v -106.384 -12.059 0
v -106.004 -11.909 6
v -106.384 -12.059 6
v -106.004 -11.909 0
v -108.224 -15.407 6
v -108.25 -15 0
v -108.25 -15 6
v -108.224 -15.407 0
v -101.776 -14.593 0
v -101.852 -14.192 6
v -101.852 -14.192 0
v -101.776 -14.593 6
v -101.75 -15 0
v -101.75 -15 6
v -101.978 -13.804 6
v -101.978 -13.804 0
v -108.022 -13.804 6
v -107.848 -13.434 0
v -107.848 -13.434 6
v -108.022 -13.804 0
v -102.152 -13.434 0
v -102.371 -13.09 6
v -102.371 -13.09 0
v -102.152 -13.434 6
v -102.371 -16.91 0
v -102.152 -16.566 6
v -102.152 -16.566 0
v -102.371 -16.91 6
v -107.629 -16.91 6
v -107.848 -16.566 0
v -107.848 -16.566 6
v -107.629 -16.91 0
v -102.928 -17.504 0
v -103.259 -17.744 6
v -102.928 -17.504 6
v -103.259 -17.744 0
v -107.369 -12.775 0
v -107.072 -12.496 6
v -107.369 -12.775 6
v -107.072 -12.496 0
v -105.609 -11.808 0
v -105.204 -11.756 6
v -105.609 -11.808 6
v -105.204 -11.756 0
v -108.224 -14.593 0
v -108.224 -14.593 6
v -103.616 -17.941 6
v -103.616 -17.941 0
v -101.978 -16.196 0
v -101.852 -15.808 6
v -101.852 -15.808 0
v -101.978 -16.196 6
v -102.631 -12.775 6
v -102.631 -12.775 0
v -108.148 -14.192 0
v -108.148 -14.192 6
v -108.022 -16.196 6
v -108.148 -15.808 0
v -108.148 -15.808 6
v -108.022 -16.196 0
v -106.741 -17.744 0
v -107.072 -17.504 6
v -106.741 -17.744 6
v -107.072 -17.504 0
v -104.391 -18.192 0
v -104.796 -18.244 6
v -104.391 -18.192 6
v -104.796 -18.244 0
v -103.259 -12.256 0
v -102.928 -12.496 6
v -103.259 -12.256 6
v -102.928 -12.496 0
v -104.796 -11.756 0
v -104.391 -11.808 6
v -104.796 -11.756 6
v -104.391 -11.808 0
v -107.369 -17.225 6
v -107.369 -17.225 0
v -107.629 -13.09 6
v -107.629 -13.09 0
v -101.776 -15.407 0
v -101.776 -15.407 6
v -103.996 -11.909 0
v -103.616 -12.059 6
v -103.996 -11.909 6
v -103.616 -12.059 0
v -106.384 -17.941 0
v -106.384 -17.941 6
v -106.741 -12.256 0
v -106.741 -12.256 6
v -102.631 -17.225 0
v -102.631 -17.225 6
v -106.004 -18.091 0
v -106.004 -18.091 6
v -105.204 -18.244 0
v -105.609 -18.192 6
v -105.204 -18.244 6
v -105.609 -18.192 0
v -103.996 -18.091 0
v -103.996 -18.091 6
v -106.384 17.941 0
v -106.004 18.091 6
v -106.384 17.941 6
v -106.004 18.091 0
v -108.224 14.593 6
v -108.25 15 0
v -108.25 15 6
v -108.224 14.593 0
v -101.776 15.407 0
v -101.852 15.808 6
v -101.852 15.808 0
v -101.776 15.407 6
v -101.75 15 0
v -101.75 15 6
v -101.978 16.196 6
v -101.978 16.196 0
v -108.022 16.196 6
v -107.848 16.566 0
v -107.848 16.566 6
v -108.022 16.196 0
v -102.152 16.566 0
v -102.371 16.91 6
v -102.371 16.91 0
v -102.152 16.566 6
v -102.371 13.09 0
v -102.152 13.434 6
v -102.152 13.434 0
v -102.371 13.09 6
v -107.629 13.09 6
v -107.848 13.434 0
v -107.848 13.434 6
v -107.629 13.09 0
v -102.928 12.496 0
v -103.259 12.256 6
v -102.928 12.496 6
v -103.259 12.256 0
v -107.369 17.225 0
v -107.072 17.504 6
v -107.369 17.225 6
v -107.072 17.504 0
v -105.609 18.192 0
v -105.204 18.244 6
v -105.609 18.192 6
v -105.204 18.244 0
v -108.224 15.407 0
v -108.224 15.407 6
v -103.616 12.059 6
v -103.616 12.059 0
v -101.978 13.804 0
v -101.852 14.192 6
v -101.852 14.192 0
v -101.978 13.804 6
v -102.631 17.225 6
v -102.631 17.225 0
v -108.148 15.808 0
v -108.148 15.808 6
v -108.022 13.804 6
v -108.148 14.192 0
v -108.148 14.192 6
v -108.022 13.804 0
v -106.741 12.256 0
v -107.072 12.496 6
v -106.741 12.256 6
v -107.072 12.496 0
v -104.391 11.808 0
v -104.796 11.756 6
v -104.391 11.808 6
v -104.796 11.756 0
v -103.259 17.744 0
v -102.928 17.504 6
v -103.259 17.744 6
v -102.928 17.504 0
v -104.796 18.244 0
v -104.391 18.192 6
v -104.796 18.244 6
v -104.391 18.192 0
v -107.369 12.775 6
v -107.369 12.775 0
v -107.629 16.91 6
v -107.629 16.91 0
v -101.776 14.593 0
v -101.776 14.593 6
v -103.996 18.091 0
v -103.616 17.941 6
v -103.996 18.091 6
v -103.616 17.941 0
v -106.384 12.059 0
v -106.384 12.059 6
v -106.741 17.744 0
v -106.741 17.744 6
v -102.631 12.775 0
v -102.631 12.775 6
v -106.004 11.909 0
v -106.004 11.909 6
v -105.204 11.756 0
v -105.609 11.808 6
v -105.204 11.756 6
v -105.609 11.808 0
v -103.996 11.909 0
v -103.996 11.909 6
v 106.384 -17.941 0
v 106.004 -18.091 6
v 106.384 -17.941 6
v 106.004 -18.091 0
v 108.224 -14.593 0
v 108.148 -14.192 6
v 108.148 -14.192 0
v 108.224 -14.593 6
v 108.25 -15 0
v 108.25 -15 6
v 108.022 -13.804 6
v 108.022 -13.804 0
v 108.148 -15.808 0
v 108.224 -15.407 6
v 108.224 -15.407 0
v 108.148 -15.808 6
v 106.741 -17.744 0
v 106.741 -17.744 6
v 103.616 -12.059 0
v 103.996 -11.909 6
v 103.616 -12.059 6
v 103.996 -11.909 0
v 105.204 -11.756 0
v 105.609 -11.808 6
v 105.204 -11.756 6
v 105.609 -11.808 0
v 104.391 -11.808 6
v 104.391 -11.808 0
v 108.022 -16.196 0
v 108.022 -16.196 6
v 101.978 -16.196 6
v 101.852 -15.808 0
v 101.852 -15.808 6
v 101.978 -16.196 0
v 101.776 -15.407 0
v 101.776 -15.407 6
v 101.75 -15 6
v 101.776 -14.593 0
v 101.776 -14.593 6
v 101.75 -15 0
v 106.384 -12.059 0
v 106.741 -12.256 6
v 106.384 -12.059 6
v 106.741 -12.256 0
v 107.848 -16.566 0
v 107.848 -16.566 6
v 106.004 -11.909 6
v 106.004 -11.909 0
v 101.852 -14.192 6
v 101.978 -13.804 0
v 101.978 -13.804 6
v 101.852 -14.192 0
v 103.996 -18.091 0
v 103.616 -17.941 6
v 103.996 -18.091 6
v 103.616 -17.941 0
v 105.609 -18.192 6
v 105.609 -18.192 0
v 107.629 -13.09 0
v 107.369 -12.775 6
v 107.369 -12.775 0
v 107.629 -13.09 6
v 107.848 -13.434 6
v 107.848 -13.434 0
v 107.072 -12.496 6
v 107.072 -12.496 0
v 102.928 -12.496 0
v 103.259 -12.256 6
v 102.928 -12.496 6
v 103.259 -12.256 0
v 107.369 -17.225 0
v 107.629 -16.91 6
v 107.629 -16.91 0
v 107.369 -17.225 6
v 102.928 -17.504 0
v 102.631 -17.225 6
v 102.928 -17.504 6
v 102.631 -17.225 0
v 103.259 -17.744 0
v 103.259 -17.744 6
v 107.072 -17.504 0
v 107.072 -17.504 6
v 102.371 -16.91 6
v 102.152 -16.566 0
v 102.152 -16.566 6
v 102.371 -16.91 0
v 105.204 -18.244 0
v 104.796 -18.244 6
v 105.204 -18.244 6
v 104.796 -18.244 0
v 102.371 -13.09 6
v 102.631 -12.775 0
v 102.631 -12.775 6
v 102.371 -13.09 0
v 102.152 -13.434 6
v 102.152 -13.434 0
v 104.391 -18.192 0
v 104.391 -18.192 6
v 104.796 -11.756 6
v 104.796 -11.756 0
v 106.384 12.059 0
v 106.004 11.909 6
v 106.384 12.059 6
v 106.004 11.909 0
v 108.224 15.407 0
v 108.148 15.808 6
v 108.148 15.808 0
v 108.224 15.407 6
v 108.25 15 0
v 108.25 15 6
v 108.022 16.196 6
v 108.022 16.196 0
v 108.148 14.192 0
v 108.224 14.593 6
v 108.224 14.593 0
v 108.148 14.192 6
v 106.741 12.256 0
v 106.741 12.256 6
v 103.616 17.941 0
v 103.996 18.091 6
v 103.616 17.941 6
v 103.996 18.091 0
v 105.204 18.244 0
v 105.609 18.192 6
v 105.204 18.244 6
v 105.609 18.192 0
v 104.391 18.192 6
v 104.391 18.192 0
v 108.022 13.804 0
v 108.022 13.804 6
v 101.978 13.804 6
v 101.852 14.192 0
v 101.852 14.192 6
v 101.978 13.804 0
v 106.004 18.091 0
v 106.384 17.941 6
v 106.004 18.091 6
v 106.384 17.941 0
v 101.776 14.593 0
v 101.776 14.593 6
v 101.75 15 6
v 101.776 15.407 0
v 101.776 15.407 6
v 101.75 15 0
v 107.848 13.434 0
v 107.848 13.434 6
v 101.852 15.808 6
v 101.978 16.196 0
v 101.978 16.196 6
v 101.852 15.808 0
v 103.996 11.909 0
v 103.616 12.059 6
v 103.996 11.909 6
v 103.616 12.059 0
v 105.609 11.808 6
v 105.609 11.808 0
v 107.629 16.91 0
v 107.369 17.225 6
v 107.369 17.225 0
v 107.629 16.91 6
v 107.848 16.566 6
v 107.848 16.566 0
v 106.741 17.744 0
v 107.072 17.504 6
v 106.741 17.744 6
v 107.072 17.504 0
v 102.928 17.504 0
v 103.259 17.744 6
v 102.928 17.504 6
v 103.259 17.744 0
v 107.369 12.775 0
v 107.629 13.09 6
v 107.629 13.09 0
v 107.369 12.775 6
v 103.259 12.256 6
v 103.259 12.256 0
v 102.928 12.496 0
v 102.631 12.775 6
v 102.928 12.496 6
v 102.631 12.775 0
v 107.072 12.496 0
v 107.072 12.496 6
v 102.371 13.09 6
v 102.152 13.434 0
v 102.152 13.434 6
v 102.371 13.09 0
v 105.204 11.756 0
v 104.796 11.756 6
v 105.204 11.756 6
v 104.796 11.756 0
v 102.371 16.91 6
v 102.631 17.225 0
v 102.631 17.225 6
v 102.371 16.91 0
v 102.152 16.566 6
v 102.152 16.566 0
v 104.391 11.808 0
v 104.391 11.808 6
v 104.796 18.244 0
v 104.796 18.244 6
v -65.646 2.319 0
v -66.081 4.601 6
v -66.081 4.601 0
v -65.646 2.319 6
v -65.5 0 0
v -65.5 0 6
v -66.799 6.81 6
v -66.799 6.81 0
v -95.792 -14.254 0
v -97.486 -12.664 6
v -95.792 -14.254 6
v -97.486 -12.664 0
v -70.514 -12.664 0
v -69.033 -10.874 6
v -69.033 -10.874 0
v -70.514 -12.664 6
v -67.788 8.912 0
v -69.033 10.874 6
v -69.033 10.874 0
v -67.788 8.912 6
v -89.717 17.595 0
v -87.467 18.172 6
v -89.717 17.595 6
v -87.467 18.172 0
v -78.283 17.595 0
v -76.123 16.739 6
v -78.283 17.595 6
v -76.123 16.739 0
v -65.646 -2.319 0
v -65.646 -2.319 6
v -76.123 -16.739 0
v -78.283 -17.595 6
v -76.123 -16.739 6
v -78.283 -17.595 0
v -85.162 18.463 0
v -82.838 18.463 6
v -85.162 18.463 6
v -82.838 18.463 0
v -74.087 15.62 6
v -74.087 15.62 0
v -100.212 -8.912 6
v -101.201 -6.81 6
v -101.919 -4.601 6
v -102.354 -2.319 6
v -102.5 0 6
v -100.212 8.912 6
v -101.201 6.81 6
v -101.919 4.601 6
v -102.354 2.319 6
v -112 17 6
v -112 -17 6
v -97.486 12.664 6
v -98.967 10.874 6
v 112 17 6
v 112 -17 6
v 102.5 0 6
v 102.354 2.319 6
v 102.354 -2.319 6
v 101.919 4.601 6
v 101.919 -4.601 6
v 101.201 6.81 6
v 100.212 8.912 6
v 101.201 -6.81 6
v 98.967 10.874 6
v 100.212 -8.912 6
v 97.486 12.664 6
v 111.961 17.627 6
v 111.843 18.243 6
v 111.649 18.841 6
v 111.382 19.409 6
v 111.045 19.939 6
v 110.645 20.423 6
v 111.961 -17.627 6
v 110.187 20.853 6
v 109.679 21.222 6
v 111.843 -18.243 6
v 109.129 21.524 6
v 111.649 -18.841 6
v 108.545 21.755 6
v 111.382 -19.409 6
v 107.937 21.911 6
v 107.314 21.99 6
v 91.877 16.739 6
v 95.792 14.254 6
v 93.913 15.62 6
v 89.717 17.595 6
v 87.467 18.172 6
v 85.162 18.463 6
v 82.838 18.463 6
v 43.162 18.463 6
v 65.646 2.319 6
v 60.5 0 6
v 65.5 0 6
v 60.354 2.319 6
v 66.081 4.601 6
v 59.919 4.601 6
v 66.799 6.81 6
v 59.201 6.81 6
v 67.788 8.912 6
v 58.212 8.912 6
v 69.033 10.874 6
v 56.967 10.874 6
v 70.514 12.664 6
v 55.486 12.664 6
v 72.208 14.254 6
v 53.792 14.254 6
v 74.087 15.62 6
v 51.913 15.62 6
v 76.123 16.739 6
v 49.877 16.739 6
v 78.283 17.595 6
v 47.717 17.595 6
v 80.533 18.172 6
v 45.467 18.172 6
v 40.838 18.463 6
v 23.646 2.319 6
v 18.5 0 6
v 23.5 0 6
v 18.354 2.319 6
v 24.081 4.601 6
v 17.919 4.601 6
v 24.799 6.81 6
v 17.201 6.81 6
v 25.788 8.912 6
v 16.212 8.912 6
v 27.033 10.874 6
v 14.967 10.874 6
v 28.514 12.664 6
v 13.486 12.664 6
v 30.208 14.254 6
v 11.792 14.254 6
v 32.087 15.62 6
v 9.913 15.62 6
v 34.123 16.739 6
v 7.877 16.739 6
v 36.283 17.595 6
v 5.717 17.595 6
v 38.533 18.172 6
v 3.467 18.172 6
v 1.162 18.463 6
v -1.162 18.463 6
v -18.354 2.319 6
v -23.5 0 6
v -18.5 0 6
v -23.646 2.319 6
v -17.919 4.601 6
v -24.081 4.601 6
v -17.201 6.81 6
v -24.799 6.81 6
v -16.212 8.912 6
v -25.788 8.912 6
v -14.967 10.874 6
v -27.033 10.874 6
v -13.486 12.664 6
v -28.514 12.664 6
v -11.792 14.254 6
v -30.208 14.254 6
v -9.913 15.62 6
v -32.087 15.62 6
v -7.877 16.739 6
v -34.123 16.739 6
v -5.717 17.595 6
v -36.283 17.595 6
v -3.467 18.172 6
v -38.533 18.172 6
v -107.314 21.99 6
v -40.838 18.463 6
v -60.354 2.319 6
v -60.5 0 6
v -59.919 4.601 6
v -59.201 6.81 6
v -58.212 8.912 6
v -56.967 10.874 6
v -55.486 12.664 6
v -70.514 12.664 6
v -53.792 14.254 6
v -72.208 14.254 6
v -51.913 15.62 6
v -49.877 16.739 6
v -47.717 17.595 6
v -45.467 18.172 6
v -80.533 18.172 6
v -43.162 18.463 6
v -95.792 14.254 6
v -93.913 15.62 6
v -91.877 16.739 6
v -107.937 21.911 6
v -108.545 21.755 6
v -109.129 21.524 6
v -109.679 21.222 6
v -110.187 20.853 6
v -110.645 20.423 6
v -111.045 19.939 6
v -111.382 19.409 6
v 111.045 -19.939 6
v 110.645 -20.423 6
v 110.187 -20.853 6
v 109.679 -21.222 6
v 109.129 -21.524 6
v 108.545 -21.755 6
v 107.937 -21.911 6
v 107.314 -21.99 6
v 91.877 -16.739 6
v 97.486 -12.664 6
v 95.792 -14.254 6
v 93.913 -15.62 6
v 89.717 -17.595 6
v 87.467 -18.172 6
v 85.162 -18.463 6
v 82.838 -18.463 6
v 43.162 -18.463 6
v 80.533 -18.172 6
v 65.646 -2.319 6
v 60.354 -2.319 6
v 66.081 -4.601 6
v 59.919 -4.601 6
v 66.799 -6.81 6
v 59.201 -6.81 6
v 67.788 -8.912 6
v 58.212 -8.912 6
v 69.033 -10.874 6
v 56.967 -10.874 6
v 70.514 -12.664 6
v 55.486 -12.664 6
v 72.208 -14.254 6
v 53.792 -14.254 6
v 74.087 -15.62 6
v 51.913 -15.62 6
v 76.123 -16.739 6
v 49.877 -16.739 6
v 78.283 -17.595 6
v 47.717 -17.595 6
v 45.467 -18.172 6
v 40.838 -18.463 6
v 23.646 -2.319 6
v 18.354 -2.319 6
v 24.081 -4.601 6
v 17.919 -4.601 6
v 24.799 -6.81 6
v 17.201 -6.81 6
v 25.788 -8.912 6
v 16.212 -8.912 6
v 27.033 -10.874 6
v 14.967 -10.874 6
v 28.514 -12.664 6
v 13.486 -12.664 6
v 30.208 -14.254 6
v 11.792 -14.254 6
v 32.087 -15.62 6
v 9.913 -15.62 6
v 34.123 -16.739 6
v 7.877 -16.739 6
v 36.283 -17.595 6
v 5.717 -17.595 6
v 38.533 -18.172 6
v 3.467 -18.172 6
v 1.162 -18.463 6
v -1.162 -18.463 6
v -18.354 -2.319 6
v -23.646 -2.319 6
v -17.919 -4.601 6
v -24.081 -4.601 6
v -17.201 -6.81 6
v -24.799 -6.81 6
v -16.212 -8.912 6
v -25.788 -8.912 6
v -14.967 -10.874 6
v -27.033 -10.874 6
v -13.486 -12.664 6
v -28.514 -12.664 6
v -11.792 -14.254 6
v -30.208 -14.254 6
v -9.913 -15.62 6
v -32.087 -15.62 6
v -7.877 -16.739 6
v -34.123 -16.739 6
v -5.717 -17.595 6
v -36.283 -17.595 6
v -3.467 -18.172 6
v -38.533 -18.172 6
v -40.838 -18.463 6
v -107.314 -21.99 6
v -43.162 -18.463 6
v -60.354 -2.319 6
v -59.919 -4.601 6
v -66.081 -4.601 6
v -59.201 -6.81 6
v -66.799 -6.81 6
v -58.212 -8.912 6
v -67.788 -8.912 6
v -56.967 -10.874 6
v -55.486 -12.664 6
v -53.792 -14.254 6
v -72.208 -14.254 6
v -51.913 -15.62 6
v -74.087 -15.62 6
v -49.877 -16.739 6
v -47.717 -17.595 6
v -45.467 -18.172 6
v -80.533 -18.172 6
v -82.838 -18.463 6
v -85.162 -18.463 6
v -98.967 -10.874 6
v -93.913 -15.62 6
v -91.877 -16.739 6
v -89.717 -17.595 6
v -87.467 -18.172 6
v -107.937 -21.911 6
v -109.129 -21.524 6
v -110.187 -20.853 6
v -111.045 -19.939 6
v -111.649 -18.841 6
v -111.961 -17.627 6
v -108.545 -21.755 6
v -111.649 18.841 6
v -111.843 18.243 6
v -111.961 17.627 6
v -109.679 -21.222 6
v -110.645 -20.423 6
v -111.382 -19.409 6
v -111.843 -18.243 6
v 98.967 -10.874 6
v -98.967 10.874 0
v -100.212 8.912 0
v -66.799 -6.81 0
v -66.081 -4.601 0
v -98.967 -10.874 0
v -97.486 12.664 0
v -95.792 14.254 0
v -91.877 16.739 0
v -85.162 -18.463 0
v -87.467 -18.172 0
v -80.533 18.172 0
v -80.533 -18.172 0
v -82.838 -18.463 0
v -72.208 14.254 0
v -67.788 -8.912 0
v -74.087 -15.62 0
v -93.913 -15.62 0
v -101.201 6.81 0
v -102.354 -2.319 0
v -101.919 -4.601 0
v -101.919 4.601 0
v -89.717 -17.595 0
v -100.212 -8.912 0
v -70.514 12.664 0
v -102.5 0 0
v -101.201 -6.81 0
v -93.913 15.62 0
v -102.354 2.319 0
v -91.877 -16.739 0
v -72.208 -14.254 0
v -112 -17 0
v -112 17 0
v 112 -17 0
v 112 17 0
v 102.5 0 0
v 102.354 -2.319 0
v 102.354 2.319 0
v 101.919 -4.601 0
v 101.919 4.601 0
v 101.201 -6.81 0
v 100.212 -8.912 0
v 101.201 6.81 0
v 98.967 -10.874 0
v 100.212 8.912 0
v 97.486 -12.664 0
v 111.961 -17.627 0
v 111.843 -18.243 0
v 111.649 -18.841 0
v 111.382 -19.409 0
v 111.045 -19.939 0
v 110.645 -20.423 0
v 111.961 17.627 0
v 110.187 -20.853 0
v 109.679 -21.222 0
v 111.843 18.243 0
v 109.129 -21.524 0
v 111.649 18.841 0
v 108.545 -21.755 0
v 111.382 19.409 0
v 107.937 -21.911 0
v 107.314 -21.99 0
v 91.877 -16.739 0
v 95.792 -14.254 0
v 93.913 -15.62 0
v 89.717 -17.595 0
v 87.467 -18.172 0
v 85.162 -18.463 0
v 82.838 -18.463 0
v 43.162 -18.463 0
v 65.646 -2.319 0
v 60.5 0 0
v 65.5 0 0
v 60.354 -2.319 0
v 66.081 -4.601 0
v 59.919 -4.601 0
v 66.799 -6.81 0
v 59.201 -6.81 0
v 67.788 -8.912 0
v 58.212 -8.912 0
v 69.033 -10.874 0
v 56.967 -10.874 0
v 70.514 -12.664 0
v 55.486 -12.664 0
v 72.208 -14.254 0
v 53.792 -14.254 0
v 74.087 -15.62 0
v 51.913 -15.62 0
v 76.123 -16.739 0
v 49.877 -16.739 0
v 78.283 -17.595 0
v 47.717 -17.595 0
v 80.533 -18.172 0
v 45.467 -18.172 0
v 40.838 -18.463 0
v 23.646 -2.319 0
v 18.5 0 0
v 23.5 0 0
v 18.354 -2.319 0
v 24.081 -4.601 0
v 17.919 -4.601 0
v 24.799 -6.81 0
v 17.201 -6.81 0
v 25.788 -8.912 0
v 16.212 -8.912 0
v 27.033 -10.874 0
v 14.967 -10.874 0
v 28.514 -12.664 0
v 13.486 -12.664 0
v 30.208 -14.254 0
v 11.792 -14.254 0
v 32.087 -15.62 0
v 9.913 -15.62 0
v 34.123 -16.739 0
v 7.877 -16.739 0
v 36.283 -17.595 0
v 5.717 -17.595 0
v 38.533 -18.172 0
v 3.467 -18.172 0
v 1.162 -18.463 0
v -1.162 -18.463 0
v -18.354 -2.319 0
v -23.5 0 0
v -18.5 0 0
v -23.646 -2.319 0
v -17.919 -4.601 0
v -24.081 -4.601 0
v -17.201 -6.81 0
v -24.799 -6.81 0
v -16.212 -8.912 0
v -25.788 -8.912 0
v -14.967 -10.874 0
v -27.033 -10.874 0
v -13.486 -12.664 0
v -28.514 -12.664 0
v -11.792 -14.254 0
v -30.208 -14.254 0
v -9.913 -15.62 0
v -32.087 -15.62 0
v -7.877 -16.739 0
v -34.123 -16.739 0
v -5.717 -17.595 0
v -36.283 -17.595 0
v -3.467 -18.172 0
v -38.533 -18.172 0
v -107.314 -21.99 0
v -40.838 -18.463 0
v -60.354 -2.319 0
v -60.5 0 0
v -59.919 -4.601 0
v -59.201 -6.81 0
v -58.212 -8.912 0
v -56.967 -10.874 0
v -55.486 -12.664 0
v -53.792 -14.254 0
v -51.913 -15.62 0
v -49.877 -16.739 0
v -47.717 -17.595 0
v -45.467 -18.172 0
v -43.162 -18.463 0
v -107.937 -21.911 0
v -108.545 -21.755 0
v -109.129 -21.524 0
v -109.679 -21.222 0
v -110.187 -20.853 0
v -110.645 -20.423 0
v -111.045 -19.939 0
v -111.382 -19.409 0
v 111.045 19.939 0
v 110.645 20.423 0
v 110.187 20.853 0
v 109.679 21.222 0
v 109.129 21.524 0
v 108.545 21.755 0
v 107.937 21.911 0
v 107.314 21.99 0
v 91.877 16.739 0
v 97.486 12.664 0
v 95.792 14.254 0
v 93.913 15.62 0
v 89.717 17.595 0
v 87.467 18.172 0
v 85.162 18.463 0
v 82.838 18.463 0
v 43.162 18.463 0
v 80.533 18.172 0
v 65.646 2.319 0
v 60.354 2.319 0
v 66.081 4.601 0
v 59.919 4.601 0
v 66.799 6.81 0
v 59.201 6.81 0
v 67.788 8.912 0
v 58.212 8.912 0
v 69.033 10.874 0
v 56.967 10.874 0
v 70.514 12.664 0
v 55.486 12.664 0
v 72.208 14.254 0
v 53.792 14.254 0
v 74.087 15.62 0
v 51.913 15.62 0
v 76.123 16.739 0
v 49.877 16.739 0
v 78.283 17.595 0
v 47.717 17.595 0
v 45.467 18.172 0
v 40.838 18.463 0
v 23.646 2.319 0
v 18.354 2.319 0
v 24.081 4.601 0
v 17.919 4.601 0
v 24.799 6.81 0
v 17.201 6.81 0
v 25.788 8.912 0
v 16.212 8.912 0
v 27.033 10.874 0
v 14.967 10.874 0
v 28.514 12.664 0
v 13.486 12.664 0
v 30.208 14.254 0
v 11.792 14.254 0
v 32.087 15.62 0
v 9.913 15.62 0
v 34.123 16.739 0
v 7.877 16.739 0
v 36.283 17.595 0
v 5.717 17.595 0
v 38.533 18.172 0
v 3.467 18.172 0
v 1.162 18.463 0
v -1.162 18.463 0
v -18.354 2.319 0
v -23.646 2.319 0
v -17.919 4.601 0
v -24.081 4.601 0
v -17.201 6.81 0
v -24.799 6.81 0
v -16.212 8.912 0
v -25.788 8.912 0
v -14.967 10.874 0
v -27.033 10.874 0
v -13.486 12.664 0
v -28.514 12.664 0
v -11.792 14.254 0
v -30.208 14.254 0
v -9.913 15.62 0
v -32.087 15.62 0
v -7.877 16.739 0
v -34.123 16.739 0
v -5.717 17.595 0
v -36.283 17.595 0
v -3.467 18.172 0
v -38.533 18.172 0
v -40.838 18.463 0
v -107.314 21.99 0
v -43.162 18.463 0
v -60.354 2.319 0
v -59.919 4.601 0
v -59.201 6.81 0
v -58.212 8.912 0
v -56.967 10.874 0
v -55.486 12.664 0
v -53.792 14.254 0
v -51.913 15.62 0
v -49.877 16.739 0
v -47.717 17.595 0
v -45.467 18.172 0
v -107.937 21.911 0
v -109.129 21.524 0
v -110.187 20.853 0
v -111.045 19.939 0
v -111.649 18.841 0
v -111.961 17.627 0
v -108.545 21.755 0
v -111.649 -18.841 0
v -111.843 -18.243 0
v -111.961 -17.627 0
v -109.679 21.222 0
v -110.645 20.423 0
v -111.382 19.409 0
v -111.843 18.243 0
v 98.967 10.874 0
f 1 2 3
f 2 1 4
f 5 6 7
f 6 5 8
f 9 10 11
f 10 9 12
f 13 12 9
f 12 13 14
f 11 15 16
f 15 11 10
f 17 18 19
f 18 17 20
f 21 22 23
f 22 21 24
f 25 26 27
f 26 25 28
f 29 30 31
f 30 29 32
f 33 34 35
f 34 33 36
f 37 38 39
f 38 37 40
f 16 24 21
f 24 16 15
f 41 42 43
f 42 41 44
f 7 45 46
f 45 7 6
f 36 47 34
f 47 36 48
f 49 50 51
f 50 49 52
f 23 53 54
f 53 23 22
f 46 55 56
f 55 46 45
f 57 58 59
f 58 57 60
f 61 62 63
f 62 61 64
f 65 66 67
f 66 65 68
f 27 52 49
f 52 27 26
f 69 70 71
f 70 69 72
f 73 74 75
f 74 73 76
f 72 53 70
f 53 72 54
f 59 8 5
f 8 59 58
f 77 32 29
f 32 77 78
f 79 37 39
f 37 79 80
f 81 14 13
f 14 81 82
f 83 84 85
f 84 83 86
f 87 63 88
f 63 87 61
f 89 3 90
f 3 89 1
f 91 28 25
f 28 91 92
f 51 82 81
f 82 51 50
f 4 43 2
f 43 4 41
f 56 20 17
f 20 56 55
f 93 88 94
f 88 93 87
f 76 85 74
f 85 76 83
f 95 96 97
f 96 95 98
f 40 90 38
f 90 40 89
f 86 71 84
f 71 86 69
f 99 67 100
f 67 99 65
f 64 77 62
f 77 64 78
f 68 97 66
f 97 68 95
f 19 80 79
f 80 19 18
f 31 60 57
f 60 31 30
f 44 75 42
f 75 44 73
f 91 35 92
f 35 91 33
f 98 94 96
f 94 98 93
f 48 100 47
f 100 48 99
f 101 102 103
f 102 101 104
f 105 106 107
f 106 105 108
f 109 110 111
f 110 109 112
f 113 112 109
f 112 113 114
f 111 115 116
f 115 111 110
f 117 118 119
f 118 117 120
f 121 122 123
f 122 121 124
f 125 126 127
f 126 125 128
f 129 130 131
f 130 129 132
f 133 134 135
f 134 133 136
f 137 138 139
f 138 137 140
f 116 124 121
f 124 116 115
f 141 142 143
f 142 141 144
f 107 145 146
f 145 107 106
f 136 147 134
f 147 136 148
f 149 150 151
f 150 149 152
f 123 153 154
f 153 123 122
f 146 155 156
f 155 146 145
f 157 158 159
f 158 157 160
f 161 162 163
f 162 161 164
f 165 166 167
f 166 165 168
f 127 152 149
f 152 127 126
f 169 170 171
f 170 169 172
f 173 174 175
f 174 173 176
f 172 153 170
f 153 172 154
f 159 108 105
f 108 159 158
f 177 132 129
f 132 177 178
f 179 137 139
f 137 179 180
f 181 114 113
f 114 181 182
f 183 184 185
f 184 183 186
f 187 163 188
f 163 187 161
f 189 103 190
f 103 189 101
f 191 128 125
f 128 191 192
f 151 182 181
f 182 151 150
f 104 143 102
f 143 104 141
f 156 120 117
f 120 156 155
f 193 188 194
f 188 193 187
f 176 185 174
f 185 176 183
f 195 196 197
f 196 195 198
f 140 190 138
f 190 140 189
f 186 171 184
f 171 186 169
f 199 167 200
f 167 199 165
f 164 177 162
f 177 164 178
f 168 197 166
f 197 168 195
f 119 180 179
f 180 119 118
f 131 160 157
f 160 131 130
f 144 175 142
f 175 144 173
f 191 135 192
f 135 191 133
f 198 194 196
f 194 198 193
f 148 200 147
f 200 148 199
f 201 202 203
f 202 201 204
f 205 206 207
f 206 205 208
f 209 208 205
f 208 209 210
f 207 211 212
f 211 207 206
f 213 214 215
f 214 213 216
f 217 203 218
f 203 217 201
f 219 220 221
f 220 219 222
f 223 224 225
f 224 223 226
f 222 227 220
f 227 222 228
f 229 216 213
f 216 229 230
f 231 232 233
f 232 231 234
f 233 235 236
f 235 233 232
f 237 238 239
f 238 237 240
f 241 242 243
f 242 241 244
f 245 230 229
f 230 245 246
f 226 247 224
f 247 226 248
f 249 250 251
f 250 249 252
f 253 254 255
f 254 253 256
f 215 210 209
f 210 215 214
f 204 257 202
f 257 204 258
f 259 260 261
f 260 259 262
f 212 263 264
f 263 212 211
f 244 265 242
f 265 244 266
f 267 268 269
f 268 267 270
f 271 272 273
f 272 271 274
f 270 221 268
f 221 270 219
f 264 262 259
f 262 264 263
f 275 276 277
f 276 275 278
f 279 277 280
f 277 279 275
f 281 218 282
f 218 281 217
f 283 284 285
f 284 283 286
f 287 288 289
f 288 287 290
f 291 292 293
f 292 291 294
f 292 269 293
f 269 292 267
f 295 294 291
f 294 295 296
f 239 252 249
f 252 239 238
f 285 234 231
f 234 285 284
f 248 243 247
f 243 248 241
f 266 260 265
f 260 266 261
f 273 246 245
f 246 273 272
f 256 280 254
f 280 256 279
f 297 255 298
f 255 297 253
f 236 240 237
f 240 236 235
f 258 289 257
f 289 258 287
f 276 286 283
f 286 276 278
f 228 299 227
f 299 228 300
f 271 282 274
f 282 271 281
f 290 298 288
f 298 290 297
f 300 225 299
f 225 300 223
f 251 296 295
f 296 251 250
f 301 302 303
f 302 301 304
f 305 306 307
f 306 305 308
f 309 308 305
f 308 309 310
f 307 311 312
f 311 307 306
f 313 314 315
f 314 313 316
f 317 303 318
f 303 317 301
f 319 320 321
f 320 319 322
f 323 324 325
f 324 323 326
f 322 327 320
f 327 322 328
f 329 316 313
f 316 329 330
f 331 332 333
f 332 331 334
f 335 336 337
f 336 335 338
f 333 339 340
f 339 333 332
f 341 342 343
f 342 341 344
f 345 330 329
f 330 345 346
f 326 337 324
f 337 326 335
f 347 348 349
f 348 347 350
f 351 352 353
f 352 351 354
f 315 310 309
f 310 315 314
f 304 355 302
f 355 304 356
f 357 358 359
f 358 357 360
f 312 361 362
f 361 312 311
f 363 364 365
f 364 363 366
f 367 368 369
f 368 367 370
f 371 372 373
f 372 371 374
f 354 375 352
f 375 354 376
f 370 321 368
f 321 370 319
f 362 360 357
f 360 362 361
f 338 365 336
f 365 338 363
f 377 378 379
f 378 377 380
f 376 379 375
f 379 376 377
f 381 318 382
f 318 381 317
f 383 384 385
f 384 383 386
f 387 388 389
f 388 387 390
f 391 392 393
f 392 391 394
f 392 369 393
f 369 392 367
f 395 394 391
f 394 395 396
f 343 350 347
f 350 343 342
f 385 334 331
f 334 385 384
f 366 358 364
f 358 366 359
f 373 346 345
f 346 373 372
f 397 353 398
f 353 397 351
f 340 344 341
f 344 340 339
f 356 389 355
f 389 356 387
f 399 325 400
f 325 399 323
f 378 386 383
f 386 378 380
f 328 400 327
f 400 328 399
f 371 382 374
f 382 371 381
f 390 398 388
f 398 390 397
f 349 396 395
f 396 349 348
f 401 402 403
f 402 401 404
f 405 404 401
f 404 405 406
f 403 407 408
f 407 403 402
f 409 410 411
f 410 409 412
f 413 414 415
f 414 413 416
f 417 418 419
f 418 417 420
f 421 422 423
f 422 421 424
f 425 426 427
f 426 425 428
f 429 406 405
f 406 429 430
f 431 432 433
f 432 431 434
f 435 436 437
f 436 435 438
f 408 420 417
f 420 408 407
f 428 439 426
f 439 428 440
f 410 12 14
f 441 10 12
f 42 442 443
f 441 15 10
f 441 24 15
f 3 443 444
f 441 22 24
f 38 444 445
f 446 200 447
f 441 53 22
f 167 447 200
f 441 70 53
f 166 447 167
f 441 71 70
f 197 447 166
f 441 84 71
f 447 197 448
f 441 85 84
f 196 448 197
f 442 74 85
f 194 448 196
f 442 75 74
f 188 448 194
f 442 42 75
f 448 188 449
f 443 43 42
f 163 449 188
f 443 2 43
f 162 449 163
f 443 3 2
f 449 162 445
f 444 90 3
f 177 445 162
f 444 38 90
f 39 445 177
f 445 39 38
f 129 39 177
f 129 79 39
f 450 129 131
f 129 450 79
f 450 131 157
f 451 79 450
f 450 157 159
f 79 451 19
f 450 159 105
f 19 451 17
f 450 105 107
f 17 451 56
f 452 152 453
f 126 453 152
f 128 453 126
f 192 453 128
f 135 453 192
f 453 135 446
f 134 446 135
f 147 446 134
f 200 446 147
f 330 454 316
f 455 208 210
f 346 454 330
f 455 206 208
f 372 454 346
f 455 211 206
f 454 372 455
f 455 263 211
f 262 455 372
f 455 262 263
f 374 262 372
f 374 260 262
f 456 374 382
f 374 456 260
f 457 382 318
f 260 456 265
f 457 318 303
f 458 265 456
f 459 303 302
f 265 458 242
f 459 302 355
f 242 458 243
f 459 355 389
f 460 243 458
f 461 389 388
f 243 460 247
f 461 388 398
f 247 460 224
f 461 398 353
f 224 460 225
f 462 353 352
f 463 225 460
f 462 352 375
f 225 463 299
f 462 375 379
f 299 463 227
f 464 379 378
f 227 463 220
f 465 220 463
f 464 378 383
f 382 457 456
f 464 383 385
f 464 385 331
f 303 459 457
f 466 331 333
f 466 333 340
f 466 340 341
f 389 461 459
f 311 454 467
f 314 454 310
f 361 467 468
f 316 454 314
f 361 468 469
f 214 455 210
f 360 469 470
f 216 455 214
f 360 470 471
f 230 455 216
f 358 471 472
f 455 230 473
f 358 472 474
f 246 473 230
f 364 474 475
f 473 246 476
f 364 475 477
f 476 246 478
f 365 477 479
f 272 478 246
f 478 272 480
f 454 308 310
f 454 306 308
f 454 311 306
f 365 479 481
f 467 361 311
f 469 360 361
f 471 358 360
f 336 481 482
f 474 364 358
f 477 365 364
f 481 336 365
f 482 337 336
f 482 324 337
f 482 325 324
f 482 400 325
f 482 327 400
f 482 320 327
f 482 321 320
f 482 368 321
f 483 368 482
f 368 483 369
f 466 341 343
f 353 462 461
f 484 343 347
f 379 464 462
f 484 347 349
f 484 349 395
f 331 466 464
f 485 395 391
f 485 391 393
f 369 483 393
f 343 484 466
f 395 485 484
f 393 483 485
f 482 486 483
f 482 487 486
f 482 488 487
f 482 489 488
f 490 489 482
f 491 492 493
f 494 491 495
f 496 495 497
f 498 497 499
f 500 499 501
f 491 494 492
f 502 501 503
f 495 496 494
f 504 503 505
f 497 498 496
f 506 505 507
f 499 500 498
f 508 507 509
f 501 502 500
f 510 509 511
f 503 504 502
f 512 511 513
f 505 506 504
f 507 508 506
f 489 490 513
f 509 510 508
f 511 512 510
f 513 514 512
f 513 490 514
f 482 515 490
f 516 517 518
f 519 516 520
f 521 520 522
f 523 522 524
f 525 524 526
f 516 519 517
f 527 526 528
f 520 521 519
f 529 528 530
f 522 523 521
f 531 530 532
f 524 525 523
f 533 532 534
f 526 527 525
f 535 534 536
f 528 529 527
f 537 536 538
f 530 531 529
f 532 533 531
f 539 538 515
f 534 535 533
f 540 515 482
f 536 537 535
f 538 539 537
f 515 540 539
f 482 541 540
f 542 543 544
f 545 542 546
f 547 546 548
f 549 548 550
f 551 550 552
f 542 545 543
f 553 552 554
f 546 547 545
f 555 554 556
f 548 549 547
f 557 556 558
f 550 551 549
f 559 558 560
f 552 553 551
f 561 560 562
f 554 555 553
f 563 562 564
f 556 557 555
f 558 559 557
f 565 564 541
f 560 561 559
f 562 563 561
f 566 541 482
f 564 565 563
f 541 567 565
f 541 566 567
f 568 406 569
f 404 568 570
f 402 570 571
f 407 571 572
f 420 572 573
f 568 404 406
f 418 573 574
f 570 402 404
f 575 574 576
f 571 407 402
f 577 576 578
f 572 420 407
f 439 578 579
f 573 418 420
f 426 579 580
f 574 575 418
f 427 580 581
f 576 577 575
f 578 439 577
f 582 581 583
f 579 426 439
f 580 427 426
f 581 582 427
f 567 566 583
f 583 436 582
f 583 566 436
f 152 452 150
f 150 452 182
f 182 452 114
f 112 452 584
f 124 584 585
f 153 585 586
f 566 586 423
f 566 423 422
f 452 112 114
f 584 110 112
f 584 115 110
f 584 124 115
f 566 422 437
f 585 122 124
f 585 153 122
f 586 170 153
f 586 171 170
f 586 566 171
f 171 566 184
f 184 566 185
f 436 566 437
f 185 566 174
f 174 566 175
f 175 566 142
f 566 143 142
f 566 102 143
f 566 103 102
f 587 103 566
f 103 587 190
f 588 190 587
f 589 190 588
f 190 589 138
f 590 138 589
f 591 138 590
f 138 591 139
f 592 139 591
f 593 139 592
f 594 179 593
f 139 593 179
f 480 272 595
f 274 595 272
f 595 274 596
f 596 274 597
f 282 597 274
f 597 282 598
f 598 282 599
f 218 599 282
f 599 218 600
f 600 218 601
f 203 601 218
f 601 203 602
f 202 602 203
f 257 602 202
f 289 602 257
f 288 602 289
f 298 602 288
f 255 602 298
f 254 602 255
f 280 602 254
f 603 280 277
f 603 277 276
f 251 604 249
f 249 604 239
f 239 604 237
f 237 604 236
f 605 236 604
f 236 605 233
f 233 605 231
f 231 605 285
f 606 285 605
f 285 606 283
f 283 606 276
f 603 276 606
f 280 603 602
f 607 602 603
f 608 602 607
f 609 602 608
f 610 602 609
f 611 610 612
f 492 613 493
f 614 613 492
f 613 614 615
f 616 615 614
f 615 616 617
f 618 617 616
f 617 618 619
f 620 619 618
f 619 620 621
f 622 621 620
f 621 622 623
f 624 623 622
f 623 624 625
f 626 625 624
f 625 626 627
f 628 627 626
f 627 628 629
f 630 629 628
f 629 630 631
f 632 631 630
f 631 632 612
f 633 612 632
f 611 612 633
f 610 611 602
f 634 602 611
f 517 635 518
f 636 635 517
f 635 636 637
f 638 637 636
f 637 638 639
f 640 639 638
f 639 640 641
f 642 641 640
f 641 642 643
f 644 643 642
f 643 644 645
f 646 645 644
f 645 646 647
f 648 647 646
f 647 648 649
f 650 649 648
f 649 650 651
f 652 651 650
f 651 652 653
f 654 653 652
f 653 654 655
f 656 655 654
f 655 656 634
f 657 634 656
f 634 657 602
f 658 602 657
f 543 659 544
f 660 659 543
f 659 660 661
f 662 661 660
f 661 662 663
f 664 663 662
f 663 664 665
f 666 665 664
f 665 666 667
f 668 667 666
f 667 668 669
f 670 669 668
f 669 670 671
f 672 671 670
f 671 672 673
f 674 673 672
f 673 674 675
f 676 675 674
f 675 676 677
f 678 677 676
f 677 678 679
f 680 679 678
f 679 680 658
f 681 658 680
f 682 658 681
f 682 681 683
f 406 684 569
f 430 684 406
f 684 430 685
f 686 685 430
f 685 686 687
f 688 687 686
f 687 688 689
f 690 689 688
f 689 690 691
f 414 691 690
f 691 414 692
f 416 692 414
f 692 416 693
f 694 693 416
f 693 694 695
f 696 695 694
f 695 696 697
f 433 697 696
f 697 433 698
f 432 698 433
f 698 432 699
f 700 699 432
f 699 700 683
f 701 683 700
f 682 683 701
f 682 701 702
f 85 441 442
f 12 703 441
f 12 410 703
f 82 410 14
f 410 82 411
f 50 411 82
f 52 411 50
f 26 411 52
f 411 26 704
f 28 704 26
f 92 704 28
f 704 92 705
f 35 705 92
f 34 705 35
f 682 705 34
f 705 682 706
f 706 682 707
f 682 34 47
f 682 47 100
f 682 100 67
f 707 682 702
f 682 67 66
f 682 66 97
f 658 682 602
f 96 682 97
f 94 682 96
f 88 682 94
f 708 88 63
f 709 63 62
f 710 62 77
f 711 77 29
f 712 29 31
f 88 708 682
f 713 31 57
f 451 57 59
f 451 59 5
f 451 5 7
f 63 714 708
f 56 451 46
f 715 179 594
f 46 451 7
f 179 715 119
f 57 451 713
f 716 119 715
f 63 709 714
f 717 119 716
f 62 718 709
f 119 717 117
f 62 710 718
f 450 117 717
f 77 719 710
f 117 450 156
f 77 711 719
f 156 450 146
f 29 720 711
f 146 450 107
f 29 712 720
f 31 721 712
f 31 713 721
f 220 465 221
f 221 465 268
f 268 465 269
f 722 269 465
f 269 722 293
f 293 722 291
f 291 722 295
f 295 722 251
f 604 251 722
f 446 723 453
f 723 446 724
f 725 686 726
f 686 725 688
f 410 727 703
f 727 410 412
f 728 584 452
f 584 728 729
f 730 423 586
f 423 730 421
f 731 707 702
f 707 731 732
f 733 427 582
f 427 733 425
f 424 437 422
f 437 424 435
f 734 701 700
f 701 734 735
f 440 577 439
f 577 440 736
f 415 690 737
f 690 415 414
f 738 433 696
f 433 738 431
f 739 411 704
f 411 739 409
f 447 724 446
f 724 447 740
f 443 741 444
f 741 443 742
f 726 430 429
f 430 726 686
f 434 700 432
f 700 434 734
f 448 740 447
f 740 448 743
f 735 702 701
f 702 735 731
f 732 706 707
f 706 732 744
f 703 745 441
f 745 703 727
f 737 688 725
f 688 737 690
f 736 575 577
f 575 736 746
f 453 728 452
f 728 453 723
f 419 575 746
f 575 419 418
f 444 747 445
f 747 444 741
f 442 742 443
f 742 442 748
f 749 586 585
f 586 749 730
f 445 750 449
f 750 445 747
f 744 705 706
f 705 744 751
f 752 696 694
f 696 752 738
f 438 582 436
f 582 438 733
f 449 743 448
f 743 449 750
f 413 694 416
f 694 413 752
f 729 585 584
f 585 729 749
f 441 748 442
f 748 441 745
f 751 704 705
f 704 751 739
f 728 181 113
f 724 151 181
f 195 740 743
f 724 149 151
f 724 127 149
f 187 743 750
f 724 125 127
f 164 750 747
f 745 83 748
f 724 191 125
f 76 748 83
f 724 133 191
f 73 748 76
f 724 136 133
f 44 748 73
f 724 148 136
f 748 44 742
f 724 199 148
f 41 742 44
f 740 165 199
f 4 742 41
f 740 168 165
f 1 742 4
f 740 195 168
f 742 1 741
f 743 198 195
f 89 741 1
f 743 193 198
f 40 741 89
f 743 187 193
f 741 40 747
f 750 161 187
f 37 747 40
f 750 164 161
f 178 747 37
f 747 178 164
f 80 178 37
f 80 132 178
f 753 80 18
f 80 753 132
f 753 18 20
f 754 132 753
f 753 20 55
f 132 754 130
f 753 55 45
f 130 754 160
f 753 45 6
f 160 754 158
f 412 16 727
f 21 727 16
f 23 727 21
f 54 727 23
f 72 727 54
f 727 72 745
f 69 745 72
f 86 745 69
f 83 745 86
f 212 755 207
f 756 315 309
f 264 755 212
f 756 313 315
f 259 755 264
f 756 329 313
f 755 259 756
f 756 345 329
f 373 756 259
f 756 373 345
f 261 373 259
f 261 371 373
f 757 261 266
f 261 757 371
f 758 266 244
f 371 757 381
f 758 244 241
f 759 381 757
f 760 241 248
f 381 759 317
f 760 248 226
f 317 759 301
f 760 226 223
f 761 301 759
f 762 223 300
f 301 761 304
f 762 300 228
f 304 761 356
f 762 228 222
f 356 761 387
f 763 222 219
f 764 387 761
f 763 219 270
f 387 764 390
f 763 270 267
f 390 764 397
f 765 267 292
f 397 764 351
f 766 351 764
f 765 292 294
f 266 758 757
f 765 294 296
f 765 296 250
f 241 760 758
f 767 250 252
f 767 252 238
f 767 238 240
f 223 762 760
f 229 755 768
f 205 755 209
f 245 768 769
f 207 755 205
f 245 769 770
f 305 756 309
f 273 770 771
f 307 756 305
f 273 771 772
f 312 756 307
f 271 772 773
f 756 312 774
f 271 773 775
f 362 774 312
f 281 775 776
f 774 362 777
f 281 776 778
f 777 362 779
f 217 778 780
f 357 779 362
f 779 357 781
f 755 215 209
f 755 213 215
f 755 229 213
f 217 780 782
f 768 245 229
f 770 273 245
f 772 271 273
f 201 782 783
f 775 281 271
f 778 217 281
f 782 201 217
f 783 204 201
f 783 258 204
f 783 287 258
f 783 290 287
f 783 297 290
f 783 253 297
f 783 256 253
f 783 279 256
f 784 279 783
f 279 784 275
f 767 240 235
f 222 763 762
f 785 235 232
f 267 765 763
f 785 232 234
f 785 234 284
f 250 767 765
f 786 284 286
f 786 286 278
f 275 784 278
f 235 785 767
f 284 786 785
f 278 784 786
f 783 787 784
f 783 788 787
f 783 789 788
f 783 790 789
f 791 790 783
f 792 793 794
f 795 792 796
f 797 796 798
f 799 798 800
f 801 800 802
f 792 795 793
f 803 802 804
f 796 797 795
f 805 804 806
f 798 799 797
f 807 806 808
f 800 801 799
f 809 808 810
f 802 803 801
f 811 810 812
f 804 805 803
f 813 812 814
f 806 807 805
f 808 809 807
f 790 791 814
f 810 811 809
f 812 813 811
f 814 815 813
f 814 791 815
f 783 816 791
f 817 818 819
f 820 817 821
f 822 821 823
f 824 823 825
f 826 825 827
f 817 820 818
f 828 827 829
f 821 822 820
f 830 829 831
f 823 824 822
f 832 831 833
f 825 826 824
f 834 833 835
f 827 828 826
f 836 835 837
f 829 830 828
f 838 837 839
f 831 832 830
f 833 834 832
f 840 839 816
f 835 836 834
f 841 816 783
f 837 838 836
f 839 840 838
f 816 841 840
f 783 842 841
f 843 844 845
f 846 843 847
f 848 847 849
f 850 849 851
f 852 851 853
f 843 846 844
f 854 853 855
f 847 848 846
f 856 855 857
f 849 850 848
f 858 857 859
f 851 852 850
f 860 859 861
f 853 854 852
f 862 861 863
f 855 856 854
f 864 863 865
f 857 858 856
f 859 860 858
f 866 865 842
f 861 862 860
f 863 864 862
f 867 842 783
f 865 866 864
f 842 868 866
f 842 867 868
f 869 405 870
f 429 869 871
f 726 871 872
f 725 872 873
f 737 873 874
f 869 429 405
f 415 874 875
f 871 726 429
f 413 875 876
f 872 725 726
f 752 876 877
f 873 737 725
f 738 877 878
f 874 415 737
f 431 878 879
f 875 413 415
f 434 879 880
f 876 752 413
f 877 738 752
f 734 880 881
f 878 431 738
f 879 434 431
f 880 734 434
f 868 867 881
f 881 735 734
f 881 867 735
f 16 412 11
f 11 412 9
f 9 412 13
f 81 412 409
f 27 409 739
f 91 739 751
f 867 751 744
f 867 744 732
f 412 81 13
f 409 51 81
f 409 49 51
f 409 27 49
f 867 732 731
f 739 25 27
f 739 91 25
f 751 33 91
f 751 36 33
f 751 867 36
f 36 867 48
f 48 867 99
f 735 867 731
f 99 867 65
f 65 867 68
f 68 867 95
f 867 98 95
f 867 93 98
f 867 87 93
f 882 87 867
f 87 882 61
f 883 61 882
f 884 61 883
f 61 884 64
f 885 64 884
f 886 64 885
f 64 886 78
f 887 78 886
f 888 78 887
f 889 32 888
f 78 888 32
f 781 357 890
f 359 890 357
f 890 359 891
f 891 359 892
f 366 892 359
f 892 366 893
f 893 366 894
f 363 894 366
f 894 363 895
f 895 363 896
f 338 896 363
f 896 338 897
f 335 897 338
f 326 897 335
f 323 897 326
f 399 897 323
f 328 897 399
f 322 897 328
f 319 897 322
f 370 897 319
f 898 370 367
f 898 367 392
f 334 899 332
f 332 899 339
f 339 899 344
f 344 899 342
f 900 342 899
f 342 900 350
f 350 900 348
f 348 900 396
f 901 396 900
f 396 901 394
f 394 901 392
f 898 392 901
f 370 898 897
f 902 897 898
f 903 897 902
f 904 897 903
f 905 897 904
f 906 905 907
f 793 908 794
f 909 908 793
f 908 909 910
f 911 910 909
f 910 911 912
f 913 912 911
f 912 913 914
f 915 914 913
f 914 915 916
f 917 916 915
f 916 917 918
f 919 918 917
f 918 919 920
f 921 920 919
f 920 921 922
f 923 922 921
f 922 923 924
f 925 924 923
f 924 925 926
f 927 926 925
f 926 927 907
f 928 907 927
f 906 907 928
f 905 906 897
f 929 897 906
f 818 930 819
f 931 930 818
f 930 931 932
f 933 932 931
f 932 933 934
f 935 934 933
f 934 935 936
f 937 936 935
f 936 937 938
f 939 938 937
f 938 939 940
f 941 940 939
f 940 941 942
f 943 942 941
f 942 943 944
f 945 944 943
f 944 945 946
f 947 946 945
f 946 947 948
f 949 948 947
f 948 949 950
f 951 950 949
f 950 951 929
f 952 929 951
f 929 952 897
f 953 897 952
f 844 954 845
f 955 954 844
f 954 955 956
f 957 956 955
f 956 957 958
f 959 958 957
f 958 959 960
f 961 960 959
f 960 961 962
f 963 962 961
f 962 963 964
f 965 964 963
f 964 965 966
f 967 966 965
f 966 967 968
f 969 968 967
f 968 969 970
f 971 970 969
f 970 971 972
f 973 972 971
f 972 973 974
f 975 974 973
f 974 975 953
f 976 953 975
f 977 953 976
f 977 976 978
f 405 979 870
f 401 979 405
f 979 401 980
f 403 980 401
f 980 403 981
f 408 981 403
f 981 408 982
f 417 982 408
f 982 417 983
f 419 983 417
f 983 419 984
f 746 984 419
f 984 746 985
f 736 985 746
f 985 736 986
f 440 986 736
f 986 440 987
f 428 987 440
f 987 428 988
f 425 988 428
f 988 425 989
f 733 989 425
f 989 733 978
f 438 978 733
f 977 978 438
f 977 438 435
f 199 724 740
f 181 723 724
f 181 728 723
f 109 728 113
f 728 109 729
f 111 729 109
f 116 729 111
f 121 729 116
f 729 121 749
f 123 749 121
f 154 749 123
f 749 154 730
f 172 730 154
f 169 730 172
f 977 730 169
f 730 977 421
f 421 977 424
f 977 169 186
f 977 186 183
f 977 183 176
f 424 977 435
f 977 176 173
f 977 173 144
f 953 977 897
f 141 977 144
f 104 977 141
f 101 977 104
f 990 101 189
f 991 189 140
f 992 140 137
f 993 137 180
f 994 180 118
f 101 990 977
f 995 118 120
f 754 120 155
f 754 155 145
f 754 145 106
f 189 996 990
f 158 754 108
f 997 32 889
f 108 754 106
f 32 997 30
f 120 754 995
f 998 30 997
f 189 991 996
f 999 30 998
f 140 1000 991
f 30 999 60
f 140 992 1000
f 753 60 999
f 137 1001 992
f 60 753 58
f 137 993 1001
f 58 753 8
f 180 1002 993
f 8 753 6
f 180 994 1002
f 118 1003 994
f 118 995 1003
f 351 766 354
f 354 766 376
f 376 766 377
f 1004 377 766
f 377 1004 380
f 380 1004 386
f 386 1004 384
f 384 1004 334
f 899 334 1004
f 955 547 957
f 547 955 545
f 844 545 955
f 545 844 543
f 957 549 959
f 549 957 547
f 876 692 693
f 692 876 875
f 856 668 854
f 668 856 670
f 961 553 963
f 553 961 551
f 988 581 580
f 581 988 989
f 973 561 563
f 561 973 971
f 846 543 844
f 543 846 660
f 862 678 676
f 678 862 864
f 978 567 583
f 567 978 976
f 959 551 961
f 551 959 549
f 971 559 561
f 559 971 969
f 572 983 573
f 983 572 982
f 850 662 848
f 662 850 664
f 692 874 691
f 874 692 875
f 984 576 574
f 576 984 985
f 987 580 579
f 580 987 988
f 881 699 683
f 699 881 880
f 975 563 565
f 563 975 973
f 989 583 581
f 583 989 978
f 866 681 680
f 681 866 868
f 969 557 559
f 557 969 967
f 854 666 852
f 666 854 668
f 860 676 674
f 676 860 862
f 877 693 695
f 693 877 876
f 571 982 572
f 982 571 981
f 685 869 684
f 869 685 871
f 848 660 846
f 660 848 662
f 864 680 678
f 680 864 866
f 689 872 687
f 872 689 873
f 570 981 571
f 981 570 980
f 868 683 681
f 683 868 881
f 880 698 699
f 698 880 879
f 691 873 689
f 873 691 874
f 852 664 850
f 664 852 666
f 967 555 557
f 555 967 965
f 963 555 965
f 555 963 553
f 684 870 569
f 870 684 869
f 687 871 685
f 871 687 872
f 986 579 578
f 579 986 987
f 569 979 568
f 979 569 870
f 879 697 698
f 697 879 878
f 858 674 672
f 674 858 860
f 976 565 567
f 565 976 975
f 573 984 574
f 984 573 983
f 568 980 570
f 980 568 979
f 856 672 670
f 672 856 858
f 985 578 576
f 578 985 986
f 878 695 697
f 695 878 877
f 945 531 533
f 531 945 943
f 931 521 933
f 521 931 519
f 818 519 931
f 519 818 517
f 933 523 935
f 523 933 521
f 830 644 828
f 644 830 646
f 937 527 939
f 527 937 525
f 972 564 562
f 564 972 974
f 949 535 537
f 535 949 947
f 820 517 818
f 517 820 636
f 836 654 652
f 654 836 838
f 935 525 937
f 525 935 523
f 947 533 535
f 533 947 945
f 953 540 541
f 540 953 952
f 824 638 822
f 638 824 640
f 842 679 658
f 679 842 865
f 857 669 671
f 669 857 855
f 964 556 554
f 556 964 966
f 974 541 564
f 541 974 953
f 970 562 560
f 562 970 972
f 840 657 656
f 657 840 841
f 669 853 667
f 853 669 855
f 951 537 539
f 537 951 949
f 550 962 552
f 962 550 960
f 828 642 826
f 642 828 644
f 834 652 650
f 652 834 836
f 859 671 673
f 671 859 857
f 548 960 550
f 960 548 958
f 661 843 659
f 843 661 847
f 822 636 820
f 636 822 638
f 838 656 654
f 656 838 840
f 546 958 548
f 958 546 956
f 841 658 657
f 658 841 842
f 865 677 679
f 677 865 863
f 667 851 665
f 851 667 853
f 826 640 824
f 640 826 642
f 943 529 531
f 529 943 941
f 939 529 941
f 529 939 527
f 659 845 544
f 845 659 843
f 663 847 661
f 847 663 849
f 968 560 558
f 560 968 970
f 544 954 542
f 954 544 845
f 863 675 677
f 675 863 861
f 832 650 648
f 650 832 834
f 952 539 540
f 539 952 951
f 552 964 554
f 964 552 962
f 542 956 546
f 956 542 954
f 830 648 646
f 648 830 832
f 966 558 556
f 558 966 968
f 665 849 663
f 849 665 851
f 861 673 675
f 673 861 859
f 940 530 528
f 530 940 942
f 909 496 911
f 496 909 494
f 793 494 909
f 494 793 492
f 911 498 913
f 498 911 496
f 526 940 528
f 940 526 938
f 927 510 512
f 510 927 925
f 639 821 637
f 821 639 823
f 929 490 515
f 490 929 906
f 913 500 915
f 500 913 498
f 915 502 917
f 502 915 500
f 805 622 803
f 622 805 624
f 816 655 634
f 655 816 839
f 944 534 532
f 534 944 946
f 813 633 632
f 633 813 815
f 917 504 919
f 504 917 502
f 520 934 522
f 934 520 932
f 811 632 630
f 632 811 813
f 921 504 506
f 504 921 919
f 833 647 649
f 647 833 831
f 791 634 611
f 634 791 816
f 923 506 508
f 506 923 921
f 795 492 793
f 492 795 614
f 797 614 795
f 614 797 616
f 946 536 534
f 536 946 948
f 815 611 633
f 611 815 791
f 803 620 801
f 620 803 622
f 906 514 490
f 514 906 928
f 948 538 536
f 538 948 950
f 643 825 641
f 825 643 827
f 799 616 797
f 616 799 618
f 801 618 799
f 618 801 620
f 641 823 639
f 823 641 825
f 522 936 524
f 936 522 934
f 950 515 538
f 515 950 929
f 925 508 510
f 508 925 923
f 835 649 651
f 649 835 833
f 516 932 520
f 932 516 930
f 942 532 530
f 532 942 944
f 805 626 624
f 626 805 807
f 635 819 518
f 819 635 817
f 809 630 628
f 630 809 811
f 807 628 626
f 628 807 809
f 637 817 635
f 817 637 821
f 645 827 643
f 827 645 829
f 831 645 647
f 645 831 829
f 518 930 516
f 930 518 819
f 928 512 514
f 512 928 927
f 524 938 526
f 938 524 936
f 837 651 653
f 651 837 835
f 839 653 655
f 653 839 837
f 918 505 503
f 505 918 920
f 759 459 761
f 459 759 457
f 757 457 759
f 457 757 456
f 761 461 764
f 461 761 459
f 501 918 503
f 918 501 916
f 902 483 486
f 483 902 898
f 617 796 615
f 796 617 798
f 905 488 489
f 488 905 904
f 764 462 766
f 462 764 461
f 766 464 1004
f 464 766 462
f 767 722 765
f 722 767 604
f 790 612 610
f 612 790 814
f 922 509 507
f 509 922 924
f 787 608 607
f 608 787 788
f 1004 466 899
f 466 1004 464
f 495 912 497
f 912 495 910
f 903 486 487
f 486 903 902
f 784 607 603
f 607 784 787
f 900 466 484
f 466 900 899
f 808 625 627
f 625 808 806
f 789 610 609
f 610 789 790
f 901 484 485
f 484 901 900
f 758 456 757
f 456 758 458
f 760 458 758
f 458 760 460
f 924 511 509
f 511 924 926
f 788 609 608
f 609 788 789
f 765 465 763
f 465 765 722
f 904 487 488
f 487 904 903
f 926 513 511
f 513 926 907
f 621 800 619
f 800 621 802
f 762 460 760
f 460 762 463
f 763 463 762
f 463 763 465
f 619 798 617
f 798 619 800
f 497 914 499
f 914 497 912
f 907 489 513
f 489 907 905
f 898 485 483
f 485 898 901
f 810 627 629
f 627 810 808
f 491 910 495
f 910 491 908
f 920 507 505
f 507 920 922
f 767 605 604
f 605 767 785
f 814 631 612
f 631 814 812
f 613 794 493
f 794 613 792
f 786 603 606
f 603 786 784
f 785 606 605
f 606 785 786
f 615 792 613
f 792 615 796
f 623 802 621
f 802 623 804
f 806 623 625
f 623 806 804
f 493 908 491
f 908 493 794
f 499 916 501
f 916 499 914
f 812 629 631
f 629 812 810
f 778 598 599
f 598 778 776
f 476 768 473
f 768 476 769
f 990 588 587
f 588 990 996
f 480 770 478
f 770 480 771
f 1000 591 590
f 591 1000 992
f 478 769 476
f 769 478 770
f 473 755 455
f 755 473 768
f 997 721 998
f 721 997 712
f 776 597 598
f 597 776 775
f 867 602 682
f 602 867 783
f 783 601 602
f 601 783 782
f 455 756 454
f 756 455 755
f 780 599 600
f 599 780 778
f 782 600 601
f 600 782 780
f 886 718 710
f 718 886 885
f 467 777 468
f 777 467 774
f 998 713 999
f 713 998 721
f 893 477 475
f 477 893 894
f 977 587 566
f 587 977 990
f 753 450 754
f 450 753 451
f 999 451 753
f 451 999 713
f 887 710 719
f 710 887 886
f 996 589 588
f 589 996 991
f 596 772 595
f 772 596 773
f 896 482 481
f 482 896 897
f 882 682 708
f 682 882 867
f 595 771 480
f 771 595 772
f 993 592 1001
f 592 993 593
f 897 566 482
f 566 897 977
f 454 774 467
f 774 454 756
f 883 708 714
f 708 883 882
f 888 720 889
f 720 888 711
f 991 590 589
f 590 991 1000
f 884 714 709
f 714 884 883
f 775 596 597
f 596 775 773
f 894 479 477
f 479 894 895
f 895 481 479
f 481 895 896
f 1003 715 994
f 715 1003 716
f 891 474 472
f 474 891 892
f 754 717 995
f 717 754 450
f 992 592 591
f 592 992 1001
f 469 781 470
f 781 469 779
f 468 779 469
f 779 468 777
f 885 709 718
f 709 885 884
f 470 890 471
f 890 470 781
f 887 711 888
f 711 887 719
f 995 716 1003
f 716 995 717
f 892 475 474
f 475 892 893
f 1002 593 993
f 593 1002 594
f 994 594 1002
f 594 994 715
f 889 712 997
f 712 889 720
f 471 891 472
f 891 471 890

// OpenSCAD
$fn = 50;

difference() {
	union() {
		hull() {
			translate(v = [-107.0, 17.0, 0]) {
				cylinder(h = 6, r = 5);
			}
			translate(v = [107.0, 17.0, 0]) {
				cylinder(h = 6, r = 5);
			}
			translate(v = [-107.0, -17.0, 0]) {
				cylinder(h = 6, r = 5);
			}
			translate(v = [107.0, -17.0, 0]) {
				cylinder(h = 6, r = 5);
			}
		}
	}
	union() {
		translate(v = [-105.0, -15.0, -100.0]) {
			cylinder(h = 200, r = 3.25);
		}
		translate(v = [-105.0, 15.0, -100.0]) {
			cylinder(h = 200, r = 3.25);
		}
		translate(v = [105.0, -15.0, -100.0]) {
			cylinder(h = 200, r = 3.25);
		}
		translate(v = [105.0, 15.0, -100.0]) {
			cylinder(h = 200, r = 3.25);
		}
		translate(v = [-105.0, -15.0, -100.0]) {
			cylinder(h = 200, r = 1.8);
		}
		translate(v = [-105.0, 15.0, -100.0]) {
			cylinder(h = 200, r = 1.8);
		}
		translate(v = [105.0, -15.0, -100.0]) {
			cylinder(h = 200, r = 1.8);
		}
		translate(v = [105.0, 15.0, -100.0]) {
			cylinder(h = 200, r = 1.8);
		}
		translate(v = [-84.0, 0, 0.0]) {
			cylinder(h = 6, r = 18.5);
		}
		translate(v = [-42.0, 0, 0.0]) {
			cylinder(h = 6, r = 18.5);
		}
		cylinder(h = 6, r = 18.5);
		translate(v = [42.0, 0, 0.0]) {
			cylinder(h = 6, r = 18.5);
		}
		translate(v = [84.0, 0, 0.0]) {
			cylinder(h = 6, r = 18.5);
		}
	}
}
